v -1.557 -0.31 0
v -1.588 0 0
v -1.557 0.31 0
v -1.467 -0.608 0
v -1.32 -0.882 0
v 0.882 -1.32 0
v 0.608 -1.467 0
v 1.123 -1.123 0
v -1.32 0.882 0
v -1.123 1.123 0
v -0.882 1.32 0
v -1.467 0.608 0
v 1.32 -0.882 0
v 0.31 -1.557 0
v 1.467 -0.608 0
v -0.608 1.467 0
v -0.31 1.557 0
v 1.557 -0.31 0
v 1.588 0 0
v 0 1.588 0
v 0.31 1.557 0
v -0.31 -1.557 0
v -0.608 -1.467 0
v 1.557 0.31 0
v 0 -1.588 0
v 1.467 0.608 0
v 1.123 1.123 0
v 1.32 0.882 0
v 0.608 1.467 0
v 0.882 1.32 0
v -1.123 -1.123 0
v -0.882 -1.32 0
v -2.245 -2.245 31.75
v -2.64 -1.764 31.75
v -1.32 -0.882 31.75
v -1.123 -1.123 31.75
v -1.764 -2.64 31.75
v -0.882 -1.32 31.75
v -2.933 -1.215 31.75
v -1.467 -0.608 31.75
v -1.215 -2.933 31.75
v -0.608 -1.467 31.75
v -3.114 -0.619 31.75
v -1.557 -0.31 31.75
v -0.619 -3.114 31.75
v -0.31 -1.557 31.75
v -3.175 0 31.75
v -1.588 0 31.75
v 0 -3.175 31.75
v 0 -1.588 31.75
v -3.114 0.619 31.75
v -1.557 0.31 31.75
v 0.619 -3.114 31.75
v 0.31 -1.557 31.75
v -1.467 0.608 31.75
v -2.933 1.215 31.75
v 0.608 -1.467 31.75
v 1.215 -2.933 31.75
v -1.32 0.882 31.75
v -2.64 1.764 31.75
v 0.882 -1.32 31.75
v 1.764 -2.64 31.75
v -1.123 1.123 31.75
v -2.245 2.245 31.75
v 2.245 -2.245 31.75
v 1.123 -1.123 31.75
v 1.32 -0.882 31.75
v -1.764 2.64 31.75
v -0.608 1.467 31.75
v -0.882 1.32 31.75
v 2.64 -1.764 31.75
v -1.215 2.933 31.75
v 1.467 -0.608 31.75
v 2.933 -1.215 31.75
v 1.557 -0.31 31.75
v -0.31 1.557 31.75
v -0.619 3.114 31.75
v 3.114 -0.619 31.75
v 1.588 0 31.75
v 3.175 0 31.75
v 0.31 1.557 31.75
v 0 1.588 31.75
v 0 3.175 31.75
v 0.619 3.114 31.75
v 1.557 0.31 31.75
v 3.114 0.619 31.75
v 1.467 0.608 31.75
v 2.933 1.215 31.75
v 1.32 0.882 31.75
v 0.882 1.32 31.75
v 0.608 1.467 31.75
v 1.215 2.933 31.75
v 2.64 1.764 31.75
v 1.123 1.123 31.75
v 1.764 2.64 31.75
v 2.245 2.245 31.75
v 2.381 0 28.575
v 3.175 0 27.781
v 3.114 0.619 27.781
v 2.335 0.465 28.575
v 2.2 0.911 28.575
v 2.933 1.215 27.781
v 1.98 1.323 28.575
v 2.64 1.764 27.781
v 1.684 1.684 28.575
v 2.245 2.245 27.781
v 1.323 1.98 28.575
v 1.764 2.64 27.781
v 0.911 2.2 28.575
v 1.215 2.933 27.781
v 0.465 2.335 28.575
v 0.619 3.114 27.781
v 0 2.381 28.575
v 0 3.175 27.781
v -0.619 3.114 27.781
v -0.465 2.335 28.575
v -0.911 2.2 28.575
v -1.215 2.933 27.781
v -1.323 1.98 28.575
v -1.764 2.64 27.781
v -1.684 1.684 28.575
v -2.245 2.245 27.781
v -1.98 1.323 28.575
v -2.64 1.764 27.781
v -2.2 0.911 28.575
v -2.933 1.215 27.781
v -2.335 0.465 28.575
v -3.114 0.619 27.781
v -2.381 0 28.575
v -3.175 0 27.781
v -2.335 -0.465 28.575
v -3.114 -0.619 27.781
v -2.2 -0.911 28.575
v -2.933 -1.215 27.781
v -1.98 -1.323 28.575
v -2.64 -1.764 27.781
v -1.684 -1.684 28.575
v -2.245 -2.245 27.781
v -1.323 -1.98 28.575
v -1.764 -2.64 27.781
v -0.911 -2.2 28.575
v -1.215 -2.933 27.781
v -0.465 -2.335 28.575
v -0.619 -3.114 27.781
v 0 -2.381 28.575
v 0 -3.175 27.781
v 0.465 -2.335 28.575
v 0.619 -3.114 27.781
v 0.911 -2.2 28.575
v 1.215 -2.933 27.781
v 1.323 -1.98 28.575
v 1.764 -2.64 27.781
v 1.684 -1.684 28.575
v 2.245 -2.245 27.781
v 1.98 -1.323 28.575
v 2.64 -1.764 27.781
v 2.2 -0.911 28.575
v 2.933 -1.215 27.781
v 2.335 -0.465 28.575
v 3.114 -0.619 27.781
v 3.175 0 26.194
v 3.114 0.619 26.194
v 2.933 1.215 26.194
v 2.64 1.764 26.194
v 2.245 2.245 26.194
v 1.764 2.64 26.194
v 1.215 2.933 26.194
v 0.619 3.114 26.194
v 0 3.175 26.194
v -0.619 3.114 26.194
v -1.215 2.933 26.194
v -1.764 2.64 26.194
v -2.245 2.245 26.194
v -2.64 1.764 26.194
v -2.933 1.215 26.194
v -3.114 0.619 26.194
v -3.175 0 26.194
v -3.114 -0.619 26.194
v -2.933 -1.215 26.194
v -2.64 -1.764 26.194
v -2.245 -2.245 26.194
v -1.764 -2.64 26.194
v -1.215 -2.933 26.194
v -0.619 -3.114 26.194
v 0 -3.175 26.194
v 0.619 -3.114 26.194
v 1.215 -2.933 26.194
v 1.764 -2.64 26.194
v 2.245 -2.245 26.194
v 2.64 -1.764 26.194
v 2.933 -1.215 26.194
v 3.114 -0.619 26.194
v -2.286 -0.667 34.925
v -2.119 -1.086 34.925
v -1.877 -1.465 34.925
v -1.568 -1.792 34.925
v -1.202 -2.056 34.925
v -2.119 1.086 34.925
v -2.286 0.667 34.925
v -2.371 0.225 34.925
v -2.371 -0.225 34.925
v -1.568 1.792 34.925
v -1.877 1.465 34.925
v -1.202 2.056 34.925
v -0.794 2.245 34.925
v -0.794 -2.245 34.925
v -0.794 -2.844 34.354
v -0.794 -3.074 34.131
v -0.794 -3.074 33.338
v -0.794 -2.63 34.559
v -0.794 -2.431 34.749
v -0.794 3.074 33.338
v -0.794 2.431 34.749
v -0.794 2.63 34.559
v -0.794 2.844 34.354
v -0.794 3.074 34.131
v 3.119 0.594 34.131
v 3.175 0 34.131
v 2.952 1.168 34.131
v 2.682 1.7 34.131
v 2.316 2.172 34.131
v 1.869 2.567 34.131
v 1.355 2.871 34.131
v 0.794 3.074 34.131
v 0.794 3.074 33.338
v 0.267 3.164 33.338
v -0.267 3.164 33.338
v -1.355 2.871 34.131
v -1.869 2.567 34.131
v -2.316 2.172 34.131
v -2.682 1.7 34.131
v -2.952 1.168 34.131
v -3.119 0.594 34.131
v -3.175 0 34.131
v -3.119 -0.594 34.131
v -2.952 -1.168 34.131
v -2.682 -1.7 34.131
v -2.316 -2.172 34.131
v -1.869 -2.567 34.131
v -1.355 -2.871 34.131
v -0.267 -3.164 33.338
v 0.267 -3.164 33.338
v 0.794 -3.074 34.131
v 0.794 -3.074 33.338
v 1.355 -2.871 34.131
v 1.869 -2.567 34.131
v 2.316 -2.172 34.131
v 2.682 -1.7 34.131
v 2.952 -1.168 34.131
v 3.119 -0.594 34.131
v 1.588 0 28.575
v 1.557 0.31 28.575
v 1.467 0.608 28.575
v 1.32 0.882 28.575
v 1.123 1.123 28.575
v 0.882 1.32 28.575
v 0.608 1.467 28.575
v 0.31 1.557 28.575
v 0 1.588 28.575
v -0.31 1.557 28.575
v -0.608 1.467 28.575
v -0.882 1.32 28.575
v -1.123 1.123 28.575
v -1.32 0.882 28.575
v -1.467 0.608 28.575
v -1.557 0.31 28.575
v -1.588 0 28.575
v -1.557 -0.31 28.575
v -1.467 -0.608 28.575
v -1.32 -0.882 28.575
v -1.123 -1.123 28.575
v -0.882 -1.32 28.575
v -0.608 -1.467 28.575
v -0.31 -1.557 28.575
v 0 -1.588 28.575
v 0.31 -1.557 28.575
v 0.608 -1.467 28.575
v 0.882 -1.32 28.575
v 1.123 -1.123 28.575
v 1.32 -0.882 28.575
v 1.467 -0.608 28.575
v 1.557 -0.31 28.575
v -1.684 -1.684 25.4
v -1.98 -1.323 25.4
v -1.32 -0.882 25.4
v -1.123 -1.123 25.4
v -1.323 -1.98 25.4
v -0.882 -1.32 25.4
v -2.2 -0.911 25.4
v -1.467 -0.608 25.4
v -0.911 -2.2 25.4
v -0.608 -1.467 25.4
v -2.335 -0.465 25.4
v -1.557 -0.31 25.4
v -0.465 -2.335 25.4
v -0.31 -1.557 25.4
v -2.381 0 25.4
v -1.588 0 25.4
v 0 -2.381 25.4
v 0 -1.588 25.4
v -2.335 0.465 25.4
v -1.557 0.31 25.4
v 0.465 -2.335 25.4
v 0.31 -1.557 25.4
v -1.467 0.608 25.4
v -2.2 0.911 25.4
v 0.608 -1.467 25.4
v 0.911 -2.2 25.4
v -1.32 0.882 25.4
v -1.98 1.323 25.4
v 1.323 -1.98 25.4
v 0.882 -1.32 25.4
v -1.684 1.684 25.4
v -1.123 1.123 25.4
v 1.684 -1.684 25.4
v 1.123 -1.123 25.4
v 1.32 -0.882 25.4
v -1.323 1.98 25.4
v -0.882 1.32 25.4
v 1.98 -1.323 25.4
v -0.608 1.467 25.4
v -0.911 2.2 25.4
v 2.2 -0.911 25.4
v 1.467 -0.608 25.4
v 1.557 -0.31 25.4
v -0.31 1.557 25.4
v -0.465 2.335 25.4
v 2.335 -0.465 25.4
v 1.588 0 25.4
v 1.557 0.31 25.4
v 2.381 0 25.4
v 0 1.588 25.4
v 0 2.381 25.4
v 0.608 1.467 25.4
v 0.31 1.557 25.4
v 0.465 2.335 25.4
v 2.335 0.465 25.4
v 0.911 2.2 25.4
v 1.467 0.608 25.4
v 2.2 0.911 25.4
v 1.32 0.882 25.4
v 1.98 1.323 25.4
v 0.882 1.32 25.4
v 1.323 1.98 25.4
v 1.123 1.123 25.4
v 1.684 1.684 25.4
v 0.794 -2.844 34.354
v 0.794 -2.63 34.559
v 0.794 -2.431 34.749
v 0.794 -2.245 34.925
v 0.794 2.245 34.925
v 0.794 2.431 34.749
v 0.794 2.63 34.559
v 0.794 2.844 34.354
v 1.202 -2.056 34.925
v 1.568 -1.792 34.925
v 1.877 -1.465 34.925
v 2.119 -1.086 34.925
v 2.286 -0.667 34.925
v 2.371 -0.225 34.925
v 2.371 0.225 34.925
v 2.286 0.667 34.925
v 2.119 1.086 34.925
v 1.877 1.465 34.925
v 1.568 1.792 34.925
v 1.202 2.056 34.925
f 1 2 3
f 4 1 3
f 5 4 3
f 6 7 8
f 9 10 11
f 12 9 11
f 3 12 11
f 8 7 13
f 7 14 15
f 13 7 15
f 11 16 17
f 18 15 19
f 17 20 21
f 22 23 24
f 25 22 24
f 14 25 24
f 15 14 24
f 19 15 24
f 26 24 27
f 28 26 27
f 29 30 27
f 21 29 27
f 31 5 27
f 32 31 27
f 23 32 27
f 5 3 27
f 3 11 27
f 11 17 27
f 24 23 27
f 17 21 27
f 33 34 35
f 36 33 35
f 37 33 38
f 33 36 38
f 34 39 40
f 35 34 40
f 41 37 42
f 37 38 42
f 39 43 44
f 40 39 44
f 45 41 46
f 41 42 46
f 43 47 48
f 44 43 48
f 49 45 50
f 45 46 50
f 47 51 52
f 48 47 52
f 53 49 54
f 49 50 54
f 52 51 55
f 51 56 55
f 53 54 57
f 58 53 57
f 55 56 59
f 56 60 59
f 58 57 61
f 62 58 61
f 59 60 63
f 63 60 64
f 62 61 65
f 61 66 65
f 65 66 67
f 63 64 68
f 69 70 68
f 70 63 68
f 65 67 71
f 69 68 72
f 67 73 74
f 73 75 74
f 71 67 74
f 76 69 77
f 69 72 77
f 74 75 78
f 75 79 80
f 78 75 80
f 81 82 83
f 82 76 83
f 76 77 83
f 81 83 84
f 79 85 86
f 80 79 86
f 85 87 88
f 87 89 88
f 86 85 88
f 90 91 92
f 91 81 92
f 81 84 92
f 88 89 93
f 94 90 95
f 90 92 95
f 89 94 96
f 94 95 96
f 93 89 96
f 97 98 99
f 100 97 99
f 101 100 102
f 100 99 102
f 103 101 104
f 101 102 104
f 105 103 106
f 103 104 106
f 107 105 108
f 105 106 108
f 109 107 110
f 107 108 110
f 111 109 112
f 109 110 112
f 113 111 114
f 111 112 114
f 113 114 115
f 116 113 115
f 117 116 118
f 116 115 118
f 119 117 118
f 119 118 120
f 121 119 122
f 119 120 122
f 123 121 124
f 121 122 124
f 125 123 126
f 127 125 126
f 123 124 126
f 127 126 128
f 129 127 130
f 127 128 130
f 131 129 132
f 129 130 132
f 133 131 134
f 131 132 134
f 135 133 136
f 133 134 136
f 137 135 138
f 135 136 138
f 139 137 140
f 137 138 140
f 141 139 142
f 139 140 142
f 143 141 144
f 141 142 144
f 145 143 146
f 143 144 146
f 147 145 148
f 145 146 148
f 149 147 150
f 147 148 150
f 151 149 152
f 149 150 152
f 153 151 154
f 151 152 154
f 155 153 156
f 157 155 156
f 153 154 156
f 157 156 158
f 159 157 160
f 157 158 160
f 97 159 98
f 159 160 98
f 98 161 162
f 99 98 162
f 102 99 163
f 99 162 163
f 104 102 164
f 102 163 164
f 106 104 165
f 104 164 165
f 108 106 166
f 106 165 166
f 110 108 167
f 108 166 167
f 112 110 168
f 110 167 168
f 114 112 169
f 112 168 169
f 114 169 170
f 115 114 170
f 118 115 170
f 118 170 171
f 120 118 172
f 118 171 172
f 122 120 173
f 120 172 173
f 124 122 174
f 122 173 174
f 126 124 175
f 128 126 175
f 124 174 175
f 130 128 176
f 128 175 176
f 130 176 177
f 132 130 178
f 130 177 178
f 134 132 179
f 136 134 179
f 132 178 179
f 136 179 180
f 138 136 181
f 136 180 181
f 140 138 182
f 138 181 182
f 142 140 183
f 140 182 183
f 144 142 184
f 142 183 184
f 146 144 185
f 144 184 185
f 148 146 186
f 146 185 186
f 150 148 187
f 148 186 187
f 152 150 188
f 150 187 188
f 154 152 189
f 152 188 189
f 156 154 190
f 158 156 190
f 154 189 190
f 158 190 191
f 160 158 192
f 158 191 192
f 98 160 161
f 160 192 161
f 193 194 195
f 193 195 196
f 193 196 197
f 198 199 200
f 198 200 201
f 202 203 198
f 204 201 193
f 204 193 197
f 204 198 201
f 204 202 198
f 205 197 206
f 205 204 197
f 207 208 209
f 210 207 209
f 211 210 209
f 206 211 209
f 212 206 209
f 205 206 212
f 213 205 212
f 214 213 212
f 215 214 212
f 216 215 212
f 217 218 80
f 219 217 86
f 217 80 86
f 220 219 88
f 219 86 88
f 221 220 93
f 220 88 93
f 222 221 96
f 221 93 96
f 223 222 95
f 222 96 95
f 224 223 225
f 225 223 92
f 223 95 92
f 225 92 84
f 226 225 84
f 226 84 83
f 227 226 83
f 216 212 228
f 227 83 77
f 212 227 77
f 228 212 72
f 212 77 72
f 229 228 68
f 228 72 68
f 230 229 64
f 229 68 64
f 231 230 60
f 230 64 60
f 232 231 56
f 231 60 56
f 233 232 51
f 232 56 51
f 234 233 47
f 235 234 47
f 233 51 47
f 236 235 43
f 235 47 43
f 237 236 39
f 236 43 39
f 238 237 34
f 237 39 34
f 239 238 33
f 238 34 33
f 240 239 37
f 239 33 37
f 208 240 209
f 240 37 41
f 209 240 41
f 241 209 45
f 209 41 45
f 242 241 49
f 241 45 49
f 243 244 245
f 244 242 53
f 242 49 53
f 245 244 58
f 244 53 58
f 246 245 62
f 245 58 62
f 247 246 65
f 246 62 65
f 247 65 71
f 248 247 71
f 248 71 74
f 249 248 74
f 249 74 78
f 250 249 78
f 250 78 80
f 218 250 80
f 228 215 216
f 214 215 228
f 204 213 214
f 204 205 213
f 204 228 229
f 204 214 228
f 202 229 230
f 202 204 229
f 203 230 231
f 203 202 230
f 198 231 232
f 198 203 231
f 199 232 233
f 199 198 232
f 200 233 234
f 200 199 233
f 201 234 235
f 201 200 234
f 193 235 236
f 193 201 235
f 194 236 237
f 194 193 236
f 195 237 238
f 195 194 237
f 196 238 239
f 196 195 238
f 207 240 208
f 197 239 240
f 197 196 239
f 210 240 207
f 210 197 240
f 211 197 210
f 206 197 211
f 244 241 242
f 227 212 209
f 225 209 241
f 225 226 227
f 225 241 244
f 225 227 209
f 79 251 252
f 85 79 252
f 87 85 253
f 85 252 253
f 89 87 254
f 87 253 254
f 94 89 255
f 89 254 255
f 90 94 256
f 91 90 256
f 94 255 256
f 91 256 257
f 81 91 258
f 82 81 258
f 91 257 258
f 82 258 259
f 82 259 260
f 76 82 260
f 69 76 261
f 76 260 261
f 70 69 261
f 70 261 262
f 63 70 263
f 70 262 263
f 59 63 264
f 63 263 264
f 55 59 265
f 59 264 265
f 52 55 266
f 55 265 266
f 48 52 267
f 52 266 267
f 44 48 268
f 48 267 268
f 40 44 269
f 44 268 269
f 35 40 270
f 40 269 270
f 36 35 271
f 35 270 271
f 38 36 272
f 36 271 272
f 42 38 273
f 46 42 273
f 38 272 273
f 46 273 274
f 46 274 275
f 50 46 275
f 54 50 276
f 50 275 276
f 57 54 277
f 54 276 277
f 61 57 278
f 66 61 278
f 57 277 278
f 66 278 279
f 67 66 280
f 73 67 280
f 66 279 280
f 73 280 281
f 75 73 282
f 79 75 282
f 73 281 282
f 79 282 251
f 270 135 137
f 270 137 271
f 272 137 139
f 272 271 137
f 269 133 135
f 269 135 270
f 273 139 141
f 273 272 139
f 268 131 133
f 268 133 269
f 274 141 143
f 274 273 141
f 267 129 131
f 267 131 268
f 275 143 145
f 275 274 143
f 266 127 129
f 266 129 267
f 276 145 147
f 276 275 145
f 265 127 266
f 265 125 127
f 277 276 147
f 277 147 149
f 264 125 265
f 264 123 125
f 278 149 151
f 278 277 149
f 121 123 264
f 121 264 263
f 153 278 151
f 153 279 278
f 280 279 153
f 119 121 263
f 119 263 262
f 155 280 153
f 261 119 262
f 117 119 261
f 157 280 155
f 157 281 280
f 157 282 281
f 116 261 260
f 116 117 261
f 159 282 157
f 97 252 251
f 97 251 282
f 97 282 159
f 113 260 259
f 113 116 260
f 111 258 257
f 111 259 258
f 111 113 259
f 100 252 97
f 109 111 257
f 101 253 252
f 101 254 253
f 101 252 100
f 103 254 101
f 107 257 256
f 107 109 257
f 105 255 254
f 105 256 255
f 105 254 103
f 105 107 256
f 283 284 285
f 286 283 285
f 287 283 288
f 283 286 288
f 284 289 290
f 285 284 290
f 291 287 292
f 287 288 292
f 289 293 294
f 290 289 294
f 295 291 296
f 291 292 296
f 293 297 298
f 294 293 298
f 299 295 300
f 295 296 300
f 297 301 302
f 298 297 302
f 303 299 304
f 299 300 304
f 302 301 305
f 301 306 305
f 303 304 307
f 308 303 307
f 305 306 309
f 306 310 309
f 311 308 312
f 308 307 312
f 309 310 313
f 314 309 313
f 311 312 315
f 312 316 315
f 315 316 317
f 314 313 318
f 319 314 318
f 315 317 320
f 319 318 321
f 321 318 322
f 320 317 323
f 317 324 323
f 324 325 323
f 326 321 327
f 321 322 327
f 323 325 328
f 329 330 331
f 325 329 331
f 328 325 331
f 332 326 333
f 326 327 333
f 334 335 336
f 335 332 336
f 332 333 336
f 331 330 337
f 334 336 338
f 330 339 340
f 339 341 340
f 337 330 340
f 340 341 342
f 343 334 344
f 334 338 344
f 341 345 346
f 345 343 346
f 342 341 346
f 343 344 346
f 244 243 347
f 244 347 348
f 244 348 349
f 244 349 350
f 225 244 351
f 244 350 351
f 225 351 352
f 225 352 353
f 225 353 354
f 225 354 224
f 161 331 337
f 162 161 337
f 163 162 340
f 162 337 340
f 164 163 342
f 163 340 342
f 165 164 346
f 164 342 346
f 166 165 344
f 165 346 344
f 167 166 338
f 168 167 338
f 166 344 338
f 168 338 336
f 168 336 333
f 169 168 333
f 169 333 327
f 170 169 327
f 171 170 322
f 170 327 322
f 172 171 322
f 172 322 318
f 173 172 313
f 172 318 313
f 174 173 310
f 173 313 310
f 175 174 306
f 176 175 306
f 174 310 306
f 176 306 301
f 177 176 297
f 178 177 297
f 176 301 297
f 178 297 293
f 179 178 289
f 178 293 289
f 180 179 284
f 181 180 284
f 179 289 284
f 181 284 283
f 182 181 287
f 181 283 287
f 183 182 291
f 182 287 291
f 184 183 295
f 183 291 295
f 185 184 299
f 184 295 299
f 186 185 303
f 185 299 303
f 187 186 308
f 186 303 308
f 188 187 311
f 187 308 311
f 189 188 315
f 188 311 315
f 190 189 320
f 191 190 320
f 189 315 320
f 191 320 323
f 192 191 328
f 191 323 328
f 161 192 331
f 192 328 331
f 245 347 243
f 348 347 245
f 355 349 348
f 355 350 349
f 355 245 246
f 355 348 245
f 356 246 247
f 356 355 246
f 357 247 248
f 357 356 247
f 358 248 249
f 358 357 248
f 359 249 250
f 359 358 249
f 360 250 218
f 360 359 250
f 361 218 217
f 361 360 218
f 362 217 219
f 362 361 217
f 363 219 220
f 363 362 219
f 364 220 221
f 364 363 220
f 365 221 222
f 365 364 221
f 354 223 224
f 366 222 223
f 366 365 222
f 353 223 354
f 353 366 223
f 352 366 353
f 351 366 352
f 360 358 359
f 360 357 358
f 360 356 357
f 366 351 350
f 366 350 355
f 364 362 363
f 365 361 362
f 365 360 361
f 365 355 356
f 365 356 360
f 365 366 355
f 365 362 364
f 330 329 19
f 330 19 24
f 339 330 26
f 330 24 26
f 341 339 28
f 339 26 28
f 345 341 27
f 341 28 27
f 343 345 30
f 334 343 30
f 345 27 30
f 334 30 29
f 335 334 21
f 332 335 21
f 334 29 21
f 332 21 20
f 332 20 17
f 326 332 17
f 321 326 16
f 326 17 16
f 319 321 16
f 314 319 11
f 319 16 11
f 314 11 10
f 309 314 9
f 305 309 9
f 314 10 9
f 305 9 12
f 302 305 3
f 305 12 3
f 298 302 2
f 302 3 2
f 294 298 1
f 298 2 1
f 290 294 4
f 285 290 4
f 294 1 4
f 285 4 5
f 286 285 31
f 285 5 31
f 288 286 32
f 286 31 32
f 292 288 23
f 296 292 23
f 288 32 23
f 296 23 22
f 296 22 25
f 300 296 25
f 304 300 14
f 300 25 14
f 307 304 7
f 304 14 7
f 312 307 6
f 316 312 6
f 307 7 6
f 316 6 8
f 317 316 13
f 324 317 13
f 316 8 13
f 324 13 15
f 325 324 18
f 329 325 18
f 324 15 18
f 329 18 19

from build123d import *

# Parameters (mm, degrees)
F0_R     = 1.5875
F1_DEPTH = 25.4
F2_R     = 3.175
F3_DEPTH = 3.175
F4_R     = 1.5875
F5_DEPTH = 3.175
F6_R     = 3.175
F7_DEPTH = 3.175
F8_W     = 1.5875
F8_H     = 6.35
F9_DEPTH = 1.5875
F10_SIZE = 0.79375


with BuildPart() as f1:
    # F0 (on Top) → F1 (new body)
    with BuildSketch(Plane.XY):
        Circle(F0_R)
    extrude(amount=F1_DEPTH)

    # F2 (on face) → F3 (join)
    with BuildSketch(Plane.XY.offset(25.4)):
        Circle(F2_R)
    extrude(amount=F3_DEPTH)

    # F4 (on face) → F5 (join)
    with BuildSketch(Plane.XY.offset(28.575)):
        Circle(F4_R)
    extrude(amount=F5_DEPTH)

    # F6 (on face) → F7 (join)
    with BuildSketch(Plane.XY.offset(31.75)):
        Circle(F6_R)
    extrude(amount=F7_DEPTH)

    # F8 (on face) → F9 (cut)
    with BuildSketch(Plane.XY.offset(34.925)):
        Rectangle(F8_W, F8_H)
    extrude(amount=-F9_DEPTH, mode=Mode.SUBTRACT)

    # F10
    f10_edges = [f1.edges().sort_by_distance(p)[0] for p in [
        (-3.175, 0, 34.925),
        (2.510058, 1.944282, 34.925),
        (2.510058, -1.944282, 34.925),
        (-3.175, 0, 28.575),
        (-3.175, 0, 25.4),
    ]]
    chamfer(f10_edges, length=F10_SIZE)


solid = f1.part
